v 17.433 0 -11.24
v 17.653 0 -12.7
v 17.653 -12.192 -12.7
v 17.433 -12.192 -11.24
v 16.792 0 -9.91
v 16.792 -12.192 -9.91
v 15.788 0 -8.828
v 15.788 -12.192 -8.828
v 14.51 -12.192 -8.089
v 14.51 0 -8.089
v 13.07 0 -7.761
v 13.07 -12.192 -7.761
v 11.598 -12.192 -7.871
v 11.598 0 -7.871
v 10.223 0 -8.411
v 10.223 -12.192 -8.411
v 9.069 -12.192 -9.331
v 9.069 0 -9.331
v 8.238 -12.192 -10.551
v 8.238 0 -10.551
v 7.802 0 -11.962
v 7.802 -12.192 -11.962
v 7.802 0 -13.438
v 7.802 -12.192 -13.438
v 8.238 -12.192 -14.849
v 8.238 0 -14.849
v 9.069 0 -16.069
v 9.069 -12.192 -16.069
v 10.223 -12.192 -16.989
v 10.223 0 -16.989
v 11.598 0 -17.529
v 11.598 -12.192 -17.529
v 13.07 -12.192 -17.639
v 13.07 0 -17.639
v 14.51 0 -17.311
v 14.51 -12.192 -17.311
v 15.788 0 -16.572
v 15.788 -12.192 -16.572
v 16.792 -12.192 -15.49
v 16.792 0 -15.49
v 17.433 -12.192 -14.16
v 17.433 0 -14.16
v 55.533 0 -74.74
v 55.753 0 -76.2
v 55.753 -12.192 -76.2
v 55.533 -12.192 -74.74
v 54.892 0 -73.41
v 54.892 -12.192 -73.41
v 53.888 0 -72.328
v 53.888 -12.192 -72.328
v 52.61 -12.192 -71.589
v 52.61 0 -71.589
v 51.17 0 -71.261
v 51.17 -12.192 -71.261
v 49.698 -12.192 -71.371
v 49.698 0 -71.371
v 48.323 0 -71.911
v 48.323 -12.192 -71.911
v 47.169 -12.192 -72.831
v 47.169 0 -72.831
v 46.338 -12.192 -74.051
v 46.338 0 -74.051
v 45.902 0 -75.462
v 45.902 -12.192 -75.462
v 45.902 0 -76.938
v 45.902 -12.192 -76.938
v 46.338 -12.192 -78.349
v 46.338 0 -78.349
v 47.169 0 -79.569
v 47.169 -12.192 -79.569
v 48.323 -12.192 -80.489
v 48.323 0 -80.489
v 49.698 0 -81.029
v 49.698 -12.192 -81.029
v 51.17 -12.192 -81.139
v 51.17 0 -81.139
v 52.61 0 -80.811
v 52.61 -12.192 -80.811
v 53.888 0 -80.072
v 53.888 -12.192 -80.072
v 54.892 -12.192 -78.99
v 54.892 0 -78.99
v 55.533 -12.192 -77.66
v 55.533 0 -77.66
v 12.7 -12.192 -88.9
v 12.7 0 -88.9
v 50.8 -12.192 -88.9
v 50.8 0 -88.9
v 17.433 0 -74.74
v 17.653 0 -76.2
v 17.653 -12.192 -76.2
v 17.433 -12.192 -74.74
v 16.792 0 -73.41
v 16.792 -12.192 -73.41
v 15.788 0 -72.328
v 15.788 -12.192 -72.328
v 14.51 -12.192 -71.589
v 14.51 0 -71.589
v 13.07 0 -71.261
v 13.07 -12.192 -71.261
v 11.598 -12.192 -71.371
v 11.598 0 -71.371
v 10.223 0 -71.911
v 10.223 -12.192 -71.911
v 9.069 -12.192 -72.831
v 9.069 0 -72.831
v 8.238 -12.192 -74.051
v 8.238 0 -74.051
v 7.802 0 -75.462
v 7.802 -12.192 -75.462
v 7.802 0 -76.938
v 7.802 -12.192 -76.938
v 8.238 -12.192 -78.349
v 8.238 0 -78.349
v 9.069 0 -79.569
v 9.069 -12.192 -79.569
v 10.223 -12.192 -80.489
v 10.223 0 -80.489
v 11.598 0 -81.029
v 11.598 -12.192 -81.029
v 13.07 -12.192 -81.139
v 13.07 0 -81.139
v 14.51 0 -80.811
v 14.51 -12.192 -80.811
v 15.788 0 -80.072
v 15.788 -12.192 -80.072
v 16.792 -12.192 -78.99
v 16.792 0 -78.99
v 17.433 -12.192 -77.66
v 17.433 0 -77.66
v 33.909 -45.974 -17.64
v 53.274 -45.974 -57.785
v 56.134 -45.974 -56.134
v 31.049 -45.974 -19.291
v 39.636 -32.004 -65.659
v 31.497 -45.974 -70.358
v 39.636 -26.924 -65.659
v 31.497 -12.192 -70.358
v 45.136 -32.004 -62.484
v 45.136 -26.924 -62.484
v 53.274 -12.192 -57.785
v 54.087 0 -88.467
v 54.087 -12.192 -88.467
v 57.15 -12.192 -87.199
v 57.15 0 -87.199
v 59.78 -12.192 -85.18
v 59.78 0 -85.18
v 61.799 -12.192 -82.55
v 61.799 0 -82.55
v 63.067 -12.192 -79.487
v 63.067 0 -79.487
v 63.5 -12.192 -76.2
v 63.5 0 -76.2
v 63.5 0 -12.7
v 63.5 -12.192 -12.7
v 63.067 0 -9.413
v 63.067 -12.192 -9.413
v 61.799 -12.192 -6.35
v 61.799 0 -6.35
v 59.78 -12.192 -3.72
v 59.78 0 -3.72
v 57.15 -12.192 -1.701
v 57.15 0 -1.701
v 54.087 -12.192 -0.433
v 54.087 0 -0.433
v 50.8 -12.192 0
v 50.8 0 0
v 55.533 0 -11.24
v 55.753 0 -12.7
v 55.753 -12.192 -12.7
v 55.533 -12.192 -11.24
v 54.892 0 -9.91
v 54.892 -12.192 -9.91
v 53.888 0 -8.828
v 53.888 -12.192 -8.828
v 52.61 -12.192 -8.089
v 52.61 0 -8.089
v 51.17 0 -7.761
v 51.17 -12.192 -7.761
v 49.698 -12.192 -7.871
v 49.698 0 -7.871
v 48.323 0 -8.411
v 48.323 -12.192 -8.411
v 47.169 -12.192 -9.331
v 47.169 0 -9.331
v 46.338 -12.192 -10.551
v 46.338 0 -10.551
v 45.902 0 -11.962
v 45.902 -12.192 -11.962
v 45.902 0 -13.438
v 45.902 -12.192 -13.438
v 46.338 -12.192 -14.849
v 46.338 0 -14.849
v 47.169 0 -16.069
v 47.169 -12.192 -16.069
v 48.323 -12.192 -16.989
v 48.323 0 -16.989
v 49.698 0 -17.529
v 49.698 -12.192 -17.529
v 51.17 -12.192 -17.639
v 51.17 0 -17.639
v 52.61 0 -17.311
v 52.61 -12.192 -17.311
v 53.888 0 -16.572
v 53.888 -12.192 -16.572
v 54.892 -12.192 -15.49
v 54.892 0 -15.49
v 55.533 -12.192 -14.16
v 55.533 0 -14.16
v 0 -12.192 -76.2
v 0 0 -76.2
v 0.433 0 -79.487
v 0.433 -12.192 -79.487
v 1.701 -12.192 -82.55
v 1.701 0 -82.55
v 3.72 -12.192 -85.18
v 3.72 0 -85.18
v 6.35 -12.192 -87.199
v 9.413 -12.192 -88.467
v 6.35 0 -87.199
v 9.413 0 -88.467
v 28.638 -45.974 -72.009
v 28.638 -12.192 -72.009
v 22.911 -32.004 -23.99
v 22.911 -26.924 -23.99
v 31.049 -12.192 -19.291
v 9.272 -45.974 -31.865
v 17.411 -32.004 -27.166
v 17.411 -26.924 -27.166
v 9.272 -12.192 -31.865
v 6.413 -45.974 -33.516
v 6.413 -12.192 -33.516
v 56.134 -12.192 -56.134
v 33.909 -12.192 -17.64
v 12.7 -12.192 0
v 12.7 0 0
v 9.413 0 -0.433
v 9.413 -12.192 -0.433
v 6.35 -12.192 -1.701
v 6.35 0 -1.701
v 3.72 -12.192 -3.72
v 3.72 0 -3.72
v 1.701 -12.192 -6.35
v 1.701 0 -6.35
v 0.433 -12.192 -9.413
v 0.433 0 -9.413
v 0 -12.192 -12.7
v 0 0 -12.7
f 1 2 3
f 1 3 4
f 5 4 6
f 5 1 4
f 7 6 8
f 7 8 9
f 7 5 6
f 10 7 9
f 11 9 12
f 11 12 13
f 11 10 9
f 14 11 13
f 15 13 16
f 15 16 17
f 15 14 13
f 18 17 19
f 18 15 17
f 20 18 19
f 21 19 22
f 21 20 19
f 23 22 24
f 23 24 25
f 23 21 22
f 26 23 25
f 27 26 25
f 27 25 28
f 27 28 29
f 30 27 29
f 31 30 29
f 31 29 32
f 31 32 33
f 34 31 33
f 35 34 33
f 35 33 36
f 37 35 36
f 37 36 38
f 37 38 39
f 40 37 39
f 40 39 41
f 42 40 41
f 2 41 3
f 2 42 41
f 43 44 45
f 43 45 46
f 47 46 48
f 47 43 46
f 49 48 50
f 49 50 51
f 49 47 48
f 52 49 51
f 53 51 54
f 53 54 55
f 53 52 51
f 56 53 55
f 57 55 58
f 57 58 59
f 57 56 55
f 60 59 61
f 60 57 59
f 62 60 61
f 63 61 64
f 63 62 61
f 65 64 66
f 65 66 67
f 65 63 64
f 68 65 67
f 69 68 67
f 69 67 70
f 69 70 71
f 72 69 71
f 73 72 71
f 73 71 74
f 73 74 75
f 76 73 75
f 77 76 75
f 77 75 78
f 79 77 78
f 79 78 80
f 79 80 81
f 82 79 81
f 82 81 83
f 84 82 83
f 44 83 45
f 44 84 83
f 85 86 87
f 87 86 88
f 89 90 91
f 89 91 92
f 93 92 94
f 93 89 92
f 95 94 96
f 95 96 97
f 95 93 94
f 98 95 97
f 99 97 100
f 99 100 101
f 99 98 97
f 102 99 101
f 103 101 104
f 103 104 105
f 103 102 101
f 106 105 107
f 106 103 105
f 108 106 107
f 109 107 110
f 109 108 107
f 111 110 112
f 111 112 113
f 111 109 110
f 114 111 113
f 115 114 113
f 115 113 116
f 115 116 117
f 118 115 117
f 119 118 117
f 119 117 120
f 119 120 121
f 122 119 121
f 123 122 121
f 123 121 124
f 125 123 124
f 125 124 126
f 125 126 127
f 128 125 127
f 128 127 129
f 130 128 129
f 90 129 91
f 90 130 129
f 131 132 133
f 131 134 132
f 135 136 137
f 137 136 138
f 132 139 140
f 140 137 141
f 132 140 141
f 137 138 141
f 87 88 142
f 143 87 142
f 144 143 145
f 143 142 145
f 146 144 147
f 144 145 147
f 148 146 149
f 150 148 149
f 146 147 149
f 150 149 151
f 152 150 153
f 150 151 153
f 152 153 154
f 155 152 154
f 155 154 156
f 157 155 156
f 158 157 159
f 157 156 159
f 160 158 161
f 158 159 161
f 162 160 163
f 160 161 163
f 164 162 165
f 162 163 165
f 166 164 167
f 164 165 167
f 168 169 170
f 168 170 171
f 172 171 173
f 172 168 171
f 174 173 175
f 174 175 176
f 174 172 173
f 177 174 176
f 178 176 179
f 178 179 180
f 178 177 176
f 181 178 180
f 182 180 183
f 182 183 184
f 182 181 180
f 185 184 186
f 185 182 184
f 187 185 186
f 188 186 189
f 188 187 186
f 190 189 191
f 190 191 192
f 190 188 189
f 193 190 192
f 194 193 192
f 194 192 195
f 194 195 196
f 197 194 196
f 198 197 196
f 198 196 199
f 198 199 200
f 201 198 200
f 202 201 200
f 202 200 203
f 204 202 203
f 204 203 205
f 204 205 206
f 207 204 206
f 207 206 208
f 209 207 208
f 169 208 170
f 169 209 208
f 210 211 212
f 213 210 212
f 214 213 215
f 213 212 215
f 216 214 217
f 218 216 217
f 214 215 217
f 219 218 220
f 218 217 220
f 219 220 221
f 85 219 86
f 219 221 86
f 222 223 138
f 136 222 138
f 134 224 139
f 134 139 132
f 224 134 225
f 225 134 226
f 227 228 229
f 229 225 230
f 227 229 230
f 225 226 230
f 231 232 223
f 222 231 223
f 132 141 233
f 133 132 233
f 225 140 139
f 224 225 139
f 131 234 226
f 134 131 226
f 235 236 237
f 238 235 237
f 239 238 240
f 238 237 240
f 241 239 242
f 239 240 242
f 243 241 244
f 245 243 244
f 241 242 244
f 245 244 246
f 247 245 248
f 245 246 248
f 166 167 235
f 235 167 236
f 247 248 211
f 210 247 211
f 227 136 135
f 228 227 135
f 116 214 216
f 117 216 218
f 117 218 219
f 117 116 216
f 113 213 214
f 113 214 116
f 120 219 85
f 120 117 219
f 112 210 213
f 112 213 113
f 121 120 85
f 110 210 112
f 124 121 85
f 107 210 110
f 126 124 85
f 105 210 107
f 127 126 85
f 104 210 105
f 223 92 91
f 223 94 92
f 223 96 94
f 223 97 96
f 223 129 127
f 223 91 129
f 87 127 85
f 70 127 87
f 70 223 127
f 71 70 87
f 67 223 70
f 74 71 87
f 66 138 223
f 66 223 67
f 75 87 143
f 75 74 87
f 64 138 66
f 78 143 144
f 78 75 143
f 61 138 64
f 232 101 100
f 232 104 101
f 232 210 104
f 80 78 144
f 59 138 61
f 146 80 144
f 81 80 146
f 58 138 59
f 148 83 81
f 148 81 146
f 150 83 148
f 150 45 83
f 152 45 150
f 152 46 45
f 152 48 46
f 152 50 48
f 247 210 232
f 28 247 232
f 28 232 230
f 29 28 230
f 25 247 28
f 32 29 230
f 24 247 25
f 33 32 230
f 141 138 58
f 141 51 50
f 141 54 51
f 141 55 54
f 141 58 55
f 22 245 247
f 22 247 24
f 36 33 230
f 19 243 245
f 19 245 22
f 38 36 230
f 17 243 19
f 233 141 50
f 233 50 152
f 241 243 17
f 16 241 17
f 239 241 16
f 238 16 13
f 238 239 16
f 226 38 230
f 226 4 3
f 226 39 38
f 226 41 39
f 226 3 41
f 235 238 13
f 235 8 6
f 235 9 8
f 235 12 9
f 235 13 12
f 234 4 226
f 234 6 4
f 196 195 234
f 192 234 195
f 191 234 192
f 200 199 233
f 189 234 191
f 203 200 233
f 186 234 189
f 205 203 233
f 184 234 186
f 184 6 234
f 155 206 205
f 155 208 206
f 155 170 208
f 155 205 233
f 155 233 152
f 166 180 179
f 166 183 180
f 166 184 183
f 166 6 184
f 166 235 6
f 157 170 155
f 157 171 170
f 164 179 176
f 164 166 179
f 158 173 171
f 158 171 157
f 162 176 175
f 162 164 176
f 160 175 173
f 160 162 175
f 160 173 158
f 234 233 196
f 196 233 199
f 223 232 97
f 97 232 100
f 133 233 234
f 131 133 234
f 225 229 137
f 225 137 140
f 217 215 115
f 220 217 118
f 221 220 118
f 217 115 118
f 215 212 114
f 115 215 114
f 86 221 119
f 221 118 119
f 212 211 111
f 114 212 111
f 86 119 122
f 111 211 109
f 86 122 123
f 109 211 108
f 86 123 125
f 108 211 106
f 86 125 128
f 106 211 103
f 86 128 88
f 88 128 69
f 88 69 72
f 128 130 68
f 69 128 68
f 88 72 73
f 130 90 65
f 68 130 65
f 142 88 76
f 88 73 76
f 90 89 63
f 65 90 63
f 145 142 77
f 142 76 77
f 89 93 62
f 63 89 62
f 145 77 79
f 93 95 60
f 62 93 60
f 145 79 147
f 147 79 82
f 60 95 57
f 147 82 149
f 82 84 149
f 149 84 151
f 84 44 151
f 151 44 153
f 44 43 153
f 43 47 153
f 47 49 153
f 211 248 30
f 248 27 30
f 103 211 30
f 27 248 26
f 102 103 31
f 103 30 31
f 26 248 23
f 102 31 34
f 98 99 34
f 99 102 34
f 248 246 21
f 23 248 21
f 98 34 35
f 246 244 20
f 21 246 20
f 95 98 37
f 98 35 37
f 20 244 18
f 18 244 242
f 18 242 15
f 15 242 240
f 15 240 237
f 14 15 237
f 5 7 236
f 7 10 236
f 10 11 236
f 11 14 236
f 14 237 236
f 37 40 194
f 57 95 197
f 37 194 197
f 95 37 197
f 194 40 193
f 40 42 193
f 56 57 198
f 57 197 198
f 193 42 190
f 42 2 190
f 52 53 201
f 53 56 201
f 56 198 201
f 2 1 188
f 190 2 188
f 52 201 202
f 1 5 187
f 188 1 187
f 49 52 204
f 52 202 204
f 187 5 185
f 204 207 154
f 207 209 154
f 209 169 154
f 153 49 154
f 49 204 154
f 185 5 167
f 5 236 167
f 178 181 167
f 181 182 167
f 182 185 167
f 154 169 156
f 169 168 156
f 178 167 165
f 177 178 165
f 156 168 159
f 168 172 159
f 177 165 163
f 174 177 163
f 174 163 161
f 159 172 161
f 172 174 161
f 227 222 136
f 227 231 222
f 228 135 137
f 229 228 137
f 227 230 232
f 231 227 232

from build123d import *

# Parameters (mm, degrees)
F0_R     = 4.953
F1_DEPTH = 12.192
F2_DEPTH = 45.974
F4_DEPTH = 203.2


with BuildPart() as f1:
    # F0 (on Front) → F1 (new body)
    with BuildSketch(Plane.XZ):
        with BuildLine():
            Line((50.8, 0), (12.7, 0))
            ThreePointArc((12.7, 0), (3.7197438789, -3.7197438789), (0, -12.7))
            Line((0, -12.7), (0, -76.2))
            ThreePointArc((0, -76.2), (3.7197438789, -85.1802561211), (12.7, -88.9))
            Line((12.7, -88.9), (50.8, -88.9))
            ThreePointArc((50.8, -88.9), (59.7802561211, -85.1802561211), (63.5, -76.2))
            Line((63.5, -76.2), (63.5, -12.7))
            ThreePointArc((63.5, -12.7), (59.7802561211, -3.7197438789), (50.8, 0))
        make_face()
        with Locations((12.7, -76.2)):
            Circle(F0_R, mode=Mode.SUBTRACT)
        Polygon((31.0494050882, -19.2913363232), (33.909, -17.6403), (56.134, -56.134), (53.2744050882, -57.7850363232), (45.1355580316, -62.4841397046), (39.6363370474, -65.6592095569), (31.4974899908, -70.3583129383), (28.637895079, -72.0093492615), (6.412895079, -33.5156492615), (9.2724899908, -31.8646129383), (17.4113370474, -27.1655095569), (22.9105580316, -23.9904397046), align=None, mode=Mode.SUBTRACT)
        with Locations((50.8, -76.2)):
            Circle(F0_R, mode=Mode.SUBTRACT)
        with Locations((12.7, -12.7)):
            Circle(F0_R, mode=Mode.SUBTRACT)
        with Locations((50.8, -12.7)):
            Circle(F0_R, mode=Mode.SUBTRACT)
    extrude(amount=F1_DEPTH)

    # F0 (on Front) → F2 (join)
    with BuildSketch(Plane.XZ):
        Polygon((56.134, -56.134), (33.909, -17.6403), (31.0494050882, -19.2913363232), (53.2744050882, -57.7850363232), align=None)
        Polygon((53.2744050882, -57.7850363232), (31.0494050882, -19.2913363232), (22.9105580316, -23.9904397046), (45.1355580316, -62.4841397046), align=None)
        Polygon((45.1355580316, -62.4841397046), (22.9105580316, -23.9904397046), (17.4113370474, -27.1655095569), (39.6363370474, -65.6592095569), align=None)
        Polygon((39.6363370474, -65.6592095569), (17.4113370474, -27.1655095569), (9.2724899908, -31.8646129383), (31.4974899908, -70.3583129383), align=None)
        Polygon((31.4974899908, -70.3583129383), (9.2724899908, -31.8646129383), (6.412895079, -33.5156492615), (28.637895079, -72.0093492615), align=None)
    extrude(amount=F2_DEPTH)

    # F3 (on face) → F4 (cut)
    with BuildSketch(Plane(origin=(38.3412090132, 0, -66.4069740109), x_dir=(0.8660190526, 0, 0.5000110004), z_dir=(0.5000110004, 0, -0.8660190526))):
        Polygon((-7.9025039941, 45.974), (1.4954960059, 32.004), (1.4954960059, 26.924), (7.8454960059, 26.924), (7.8454960059, 32.004), (17.2434960059, 45.974), align=None)
    extrude(amount=-F4_DEPTH, mode=Mode.SUBTRACT)


solid = f1.part
